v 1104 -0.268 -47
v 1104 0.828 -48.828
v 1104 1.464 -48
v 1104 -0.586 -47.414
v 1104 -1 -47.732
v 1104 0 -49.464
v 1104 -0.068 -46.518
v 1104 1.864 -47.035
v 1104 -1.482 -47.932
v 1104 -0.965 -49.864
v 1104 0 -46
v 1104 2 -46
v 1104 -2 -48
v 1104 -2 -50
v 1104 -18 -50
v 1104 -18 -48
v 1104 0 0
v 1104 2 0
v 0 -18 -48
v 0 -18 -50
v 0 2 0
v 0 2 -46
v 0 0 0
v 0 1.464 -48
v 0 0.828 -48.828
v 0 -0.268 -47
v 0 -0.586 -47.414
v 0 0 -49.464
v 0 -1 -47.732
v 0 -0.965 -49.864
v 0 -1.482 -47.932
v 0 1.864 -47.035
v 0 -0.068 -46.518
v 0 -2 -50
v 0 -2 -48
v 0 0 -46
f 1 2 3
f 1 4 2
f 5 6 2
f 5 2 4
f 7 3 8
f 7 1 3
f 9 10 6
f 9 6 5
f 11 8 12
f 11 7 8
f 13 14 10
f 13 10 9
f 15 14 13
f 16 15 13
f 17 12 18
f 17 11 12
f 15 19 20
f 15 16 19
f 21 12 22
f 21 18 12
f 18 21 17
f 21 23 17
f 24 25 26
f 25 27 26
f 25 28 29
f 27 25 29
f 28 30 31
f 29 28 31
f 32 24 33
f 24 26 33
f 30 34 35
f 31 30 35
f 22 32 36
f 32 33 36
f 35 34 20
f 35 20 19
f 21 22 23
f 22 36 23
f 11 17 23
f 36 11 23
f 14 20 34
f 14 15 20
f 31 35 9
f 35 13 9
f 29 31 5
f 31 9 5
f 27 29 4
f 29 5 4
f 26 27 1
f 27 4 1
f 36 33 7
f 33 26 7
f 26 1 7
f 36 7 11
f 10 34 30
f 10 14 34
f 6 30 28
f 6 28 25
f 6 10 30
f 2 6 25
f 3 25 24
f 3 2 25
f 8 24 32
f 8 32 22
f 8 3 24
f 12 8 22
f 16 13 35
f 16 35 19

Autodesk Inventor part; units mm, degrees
ref_plane "YZ Plane" through (0, 0, 0) normal (1, 0, 0) x (0, 1, 0)
ref_plane "XZ Plane" through (0, 0, 0) normal (0, 1, 0) x (-1, 0, 0)
ref_plane "XY Plane" through (0, 0, 0) normal (0, 0, 1) x (1, 0, 0)
sketch "Sketch3" plane through (0, 0, 0) normal (0, 1, 0) x (-1, 0, 0)
  line L0 (0, 0) -> (-1104, 0)
  line L1 (-1104, 0) -> (-1104, -50)
  line L2 (-1104, -50) -> (0, -50)
  line L3 (0, -50) -> (0, 0)
  dimension "d25" = 50
  dimension "d28" = 1104
extrude "Plate3" add sketch "Sketch3" along normal blind 2
sketch "Sketch4" plane through (1104, 2, -48) normal (0, 0, -1) x (-1, 0, 0)
  line L0 (1104, 0) -> (0, 0)
  line L1 (0, 0) -> (0, -20)
  line L2 (0, -20) -> (1104, -20)
  line L3 (1104, -20) -> (1104, 0)
edge flange "Flange2" height 20 angle 90 thickness 2 bend radius 2 thickness toward (0, 0, -1) relief tear relief width 2 relief depth 1 edges at (552, 0, -50) wall of the first edge with corners at (0, 2, -48) (1104, 2, -48) (1104, -18, -48) (0, -18, -48)
bend "Bend3"
corner "Corner3"
equation "\"d30\" = Thickness"
equation "\"d31\" = BendReliefWidth"
equation "\"d32\" = BendReliefDepth"
equation "\"d33\" = MinimumRemnant"
equation "\"d34\" = TransitionRadius"
equation "\"d37\" = BendRadius"
equation "\"d38\" = CornerReliefSize"
equation "\"d39\" = GapSize"
equation "\"d40\" = JacobiRadiusSize"
equation "\"BendRadius\" = Thickness"
equation "\"BendReliefWidth\" = Thickness"
equation "\"BendReliefDepth\" = 0.5 * Thickness"
equation "\"CornerReliefSize\" = 4 * Thickness"
equation "\"MinimumRemnant\" = 2 * Thickness"
equation "\"TransitionRadius\" = BendRadius"
equation "\"JacobiRadiusSize\" = BendRadius"
equation "\"GapSize\" = Thickness"
equation "\"Thickness\" = 2"
properties part number "GBK-RK-0043 rib 3"
